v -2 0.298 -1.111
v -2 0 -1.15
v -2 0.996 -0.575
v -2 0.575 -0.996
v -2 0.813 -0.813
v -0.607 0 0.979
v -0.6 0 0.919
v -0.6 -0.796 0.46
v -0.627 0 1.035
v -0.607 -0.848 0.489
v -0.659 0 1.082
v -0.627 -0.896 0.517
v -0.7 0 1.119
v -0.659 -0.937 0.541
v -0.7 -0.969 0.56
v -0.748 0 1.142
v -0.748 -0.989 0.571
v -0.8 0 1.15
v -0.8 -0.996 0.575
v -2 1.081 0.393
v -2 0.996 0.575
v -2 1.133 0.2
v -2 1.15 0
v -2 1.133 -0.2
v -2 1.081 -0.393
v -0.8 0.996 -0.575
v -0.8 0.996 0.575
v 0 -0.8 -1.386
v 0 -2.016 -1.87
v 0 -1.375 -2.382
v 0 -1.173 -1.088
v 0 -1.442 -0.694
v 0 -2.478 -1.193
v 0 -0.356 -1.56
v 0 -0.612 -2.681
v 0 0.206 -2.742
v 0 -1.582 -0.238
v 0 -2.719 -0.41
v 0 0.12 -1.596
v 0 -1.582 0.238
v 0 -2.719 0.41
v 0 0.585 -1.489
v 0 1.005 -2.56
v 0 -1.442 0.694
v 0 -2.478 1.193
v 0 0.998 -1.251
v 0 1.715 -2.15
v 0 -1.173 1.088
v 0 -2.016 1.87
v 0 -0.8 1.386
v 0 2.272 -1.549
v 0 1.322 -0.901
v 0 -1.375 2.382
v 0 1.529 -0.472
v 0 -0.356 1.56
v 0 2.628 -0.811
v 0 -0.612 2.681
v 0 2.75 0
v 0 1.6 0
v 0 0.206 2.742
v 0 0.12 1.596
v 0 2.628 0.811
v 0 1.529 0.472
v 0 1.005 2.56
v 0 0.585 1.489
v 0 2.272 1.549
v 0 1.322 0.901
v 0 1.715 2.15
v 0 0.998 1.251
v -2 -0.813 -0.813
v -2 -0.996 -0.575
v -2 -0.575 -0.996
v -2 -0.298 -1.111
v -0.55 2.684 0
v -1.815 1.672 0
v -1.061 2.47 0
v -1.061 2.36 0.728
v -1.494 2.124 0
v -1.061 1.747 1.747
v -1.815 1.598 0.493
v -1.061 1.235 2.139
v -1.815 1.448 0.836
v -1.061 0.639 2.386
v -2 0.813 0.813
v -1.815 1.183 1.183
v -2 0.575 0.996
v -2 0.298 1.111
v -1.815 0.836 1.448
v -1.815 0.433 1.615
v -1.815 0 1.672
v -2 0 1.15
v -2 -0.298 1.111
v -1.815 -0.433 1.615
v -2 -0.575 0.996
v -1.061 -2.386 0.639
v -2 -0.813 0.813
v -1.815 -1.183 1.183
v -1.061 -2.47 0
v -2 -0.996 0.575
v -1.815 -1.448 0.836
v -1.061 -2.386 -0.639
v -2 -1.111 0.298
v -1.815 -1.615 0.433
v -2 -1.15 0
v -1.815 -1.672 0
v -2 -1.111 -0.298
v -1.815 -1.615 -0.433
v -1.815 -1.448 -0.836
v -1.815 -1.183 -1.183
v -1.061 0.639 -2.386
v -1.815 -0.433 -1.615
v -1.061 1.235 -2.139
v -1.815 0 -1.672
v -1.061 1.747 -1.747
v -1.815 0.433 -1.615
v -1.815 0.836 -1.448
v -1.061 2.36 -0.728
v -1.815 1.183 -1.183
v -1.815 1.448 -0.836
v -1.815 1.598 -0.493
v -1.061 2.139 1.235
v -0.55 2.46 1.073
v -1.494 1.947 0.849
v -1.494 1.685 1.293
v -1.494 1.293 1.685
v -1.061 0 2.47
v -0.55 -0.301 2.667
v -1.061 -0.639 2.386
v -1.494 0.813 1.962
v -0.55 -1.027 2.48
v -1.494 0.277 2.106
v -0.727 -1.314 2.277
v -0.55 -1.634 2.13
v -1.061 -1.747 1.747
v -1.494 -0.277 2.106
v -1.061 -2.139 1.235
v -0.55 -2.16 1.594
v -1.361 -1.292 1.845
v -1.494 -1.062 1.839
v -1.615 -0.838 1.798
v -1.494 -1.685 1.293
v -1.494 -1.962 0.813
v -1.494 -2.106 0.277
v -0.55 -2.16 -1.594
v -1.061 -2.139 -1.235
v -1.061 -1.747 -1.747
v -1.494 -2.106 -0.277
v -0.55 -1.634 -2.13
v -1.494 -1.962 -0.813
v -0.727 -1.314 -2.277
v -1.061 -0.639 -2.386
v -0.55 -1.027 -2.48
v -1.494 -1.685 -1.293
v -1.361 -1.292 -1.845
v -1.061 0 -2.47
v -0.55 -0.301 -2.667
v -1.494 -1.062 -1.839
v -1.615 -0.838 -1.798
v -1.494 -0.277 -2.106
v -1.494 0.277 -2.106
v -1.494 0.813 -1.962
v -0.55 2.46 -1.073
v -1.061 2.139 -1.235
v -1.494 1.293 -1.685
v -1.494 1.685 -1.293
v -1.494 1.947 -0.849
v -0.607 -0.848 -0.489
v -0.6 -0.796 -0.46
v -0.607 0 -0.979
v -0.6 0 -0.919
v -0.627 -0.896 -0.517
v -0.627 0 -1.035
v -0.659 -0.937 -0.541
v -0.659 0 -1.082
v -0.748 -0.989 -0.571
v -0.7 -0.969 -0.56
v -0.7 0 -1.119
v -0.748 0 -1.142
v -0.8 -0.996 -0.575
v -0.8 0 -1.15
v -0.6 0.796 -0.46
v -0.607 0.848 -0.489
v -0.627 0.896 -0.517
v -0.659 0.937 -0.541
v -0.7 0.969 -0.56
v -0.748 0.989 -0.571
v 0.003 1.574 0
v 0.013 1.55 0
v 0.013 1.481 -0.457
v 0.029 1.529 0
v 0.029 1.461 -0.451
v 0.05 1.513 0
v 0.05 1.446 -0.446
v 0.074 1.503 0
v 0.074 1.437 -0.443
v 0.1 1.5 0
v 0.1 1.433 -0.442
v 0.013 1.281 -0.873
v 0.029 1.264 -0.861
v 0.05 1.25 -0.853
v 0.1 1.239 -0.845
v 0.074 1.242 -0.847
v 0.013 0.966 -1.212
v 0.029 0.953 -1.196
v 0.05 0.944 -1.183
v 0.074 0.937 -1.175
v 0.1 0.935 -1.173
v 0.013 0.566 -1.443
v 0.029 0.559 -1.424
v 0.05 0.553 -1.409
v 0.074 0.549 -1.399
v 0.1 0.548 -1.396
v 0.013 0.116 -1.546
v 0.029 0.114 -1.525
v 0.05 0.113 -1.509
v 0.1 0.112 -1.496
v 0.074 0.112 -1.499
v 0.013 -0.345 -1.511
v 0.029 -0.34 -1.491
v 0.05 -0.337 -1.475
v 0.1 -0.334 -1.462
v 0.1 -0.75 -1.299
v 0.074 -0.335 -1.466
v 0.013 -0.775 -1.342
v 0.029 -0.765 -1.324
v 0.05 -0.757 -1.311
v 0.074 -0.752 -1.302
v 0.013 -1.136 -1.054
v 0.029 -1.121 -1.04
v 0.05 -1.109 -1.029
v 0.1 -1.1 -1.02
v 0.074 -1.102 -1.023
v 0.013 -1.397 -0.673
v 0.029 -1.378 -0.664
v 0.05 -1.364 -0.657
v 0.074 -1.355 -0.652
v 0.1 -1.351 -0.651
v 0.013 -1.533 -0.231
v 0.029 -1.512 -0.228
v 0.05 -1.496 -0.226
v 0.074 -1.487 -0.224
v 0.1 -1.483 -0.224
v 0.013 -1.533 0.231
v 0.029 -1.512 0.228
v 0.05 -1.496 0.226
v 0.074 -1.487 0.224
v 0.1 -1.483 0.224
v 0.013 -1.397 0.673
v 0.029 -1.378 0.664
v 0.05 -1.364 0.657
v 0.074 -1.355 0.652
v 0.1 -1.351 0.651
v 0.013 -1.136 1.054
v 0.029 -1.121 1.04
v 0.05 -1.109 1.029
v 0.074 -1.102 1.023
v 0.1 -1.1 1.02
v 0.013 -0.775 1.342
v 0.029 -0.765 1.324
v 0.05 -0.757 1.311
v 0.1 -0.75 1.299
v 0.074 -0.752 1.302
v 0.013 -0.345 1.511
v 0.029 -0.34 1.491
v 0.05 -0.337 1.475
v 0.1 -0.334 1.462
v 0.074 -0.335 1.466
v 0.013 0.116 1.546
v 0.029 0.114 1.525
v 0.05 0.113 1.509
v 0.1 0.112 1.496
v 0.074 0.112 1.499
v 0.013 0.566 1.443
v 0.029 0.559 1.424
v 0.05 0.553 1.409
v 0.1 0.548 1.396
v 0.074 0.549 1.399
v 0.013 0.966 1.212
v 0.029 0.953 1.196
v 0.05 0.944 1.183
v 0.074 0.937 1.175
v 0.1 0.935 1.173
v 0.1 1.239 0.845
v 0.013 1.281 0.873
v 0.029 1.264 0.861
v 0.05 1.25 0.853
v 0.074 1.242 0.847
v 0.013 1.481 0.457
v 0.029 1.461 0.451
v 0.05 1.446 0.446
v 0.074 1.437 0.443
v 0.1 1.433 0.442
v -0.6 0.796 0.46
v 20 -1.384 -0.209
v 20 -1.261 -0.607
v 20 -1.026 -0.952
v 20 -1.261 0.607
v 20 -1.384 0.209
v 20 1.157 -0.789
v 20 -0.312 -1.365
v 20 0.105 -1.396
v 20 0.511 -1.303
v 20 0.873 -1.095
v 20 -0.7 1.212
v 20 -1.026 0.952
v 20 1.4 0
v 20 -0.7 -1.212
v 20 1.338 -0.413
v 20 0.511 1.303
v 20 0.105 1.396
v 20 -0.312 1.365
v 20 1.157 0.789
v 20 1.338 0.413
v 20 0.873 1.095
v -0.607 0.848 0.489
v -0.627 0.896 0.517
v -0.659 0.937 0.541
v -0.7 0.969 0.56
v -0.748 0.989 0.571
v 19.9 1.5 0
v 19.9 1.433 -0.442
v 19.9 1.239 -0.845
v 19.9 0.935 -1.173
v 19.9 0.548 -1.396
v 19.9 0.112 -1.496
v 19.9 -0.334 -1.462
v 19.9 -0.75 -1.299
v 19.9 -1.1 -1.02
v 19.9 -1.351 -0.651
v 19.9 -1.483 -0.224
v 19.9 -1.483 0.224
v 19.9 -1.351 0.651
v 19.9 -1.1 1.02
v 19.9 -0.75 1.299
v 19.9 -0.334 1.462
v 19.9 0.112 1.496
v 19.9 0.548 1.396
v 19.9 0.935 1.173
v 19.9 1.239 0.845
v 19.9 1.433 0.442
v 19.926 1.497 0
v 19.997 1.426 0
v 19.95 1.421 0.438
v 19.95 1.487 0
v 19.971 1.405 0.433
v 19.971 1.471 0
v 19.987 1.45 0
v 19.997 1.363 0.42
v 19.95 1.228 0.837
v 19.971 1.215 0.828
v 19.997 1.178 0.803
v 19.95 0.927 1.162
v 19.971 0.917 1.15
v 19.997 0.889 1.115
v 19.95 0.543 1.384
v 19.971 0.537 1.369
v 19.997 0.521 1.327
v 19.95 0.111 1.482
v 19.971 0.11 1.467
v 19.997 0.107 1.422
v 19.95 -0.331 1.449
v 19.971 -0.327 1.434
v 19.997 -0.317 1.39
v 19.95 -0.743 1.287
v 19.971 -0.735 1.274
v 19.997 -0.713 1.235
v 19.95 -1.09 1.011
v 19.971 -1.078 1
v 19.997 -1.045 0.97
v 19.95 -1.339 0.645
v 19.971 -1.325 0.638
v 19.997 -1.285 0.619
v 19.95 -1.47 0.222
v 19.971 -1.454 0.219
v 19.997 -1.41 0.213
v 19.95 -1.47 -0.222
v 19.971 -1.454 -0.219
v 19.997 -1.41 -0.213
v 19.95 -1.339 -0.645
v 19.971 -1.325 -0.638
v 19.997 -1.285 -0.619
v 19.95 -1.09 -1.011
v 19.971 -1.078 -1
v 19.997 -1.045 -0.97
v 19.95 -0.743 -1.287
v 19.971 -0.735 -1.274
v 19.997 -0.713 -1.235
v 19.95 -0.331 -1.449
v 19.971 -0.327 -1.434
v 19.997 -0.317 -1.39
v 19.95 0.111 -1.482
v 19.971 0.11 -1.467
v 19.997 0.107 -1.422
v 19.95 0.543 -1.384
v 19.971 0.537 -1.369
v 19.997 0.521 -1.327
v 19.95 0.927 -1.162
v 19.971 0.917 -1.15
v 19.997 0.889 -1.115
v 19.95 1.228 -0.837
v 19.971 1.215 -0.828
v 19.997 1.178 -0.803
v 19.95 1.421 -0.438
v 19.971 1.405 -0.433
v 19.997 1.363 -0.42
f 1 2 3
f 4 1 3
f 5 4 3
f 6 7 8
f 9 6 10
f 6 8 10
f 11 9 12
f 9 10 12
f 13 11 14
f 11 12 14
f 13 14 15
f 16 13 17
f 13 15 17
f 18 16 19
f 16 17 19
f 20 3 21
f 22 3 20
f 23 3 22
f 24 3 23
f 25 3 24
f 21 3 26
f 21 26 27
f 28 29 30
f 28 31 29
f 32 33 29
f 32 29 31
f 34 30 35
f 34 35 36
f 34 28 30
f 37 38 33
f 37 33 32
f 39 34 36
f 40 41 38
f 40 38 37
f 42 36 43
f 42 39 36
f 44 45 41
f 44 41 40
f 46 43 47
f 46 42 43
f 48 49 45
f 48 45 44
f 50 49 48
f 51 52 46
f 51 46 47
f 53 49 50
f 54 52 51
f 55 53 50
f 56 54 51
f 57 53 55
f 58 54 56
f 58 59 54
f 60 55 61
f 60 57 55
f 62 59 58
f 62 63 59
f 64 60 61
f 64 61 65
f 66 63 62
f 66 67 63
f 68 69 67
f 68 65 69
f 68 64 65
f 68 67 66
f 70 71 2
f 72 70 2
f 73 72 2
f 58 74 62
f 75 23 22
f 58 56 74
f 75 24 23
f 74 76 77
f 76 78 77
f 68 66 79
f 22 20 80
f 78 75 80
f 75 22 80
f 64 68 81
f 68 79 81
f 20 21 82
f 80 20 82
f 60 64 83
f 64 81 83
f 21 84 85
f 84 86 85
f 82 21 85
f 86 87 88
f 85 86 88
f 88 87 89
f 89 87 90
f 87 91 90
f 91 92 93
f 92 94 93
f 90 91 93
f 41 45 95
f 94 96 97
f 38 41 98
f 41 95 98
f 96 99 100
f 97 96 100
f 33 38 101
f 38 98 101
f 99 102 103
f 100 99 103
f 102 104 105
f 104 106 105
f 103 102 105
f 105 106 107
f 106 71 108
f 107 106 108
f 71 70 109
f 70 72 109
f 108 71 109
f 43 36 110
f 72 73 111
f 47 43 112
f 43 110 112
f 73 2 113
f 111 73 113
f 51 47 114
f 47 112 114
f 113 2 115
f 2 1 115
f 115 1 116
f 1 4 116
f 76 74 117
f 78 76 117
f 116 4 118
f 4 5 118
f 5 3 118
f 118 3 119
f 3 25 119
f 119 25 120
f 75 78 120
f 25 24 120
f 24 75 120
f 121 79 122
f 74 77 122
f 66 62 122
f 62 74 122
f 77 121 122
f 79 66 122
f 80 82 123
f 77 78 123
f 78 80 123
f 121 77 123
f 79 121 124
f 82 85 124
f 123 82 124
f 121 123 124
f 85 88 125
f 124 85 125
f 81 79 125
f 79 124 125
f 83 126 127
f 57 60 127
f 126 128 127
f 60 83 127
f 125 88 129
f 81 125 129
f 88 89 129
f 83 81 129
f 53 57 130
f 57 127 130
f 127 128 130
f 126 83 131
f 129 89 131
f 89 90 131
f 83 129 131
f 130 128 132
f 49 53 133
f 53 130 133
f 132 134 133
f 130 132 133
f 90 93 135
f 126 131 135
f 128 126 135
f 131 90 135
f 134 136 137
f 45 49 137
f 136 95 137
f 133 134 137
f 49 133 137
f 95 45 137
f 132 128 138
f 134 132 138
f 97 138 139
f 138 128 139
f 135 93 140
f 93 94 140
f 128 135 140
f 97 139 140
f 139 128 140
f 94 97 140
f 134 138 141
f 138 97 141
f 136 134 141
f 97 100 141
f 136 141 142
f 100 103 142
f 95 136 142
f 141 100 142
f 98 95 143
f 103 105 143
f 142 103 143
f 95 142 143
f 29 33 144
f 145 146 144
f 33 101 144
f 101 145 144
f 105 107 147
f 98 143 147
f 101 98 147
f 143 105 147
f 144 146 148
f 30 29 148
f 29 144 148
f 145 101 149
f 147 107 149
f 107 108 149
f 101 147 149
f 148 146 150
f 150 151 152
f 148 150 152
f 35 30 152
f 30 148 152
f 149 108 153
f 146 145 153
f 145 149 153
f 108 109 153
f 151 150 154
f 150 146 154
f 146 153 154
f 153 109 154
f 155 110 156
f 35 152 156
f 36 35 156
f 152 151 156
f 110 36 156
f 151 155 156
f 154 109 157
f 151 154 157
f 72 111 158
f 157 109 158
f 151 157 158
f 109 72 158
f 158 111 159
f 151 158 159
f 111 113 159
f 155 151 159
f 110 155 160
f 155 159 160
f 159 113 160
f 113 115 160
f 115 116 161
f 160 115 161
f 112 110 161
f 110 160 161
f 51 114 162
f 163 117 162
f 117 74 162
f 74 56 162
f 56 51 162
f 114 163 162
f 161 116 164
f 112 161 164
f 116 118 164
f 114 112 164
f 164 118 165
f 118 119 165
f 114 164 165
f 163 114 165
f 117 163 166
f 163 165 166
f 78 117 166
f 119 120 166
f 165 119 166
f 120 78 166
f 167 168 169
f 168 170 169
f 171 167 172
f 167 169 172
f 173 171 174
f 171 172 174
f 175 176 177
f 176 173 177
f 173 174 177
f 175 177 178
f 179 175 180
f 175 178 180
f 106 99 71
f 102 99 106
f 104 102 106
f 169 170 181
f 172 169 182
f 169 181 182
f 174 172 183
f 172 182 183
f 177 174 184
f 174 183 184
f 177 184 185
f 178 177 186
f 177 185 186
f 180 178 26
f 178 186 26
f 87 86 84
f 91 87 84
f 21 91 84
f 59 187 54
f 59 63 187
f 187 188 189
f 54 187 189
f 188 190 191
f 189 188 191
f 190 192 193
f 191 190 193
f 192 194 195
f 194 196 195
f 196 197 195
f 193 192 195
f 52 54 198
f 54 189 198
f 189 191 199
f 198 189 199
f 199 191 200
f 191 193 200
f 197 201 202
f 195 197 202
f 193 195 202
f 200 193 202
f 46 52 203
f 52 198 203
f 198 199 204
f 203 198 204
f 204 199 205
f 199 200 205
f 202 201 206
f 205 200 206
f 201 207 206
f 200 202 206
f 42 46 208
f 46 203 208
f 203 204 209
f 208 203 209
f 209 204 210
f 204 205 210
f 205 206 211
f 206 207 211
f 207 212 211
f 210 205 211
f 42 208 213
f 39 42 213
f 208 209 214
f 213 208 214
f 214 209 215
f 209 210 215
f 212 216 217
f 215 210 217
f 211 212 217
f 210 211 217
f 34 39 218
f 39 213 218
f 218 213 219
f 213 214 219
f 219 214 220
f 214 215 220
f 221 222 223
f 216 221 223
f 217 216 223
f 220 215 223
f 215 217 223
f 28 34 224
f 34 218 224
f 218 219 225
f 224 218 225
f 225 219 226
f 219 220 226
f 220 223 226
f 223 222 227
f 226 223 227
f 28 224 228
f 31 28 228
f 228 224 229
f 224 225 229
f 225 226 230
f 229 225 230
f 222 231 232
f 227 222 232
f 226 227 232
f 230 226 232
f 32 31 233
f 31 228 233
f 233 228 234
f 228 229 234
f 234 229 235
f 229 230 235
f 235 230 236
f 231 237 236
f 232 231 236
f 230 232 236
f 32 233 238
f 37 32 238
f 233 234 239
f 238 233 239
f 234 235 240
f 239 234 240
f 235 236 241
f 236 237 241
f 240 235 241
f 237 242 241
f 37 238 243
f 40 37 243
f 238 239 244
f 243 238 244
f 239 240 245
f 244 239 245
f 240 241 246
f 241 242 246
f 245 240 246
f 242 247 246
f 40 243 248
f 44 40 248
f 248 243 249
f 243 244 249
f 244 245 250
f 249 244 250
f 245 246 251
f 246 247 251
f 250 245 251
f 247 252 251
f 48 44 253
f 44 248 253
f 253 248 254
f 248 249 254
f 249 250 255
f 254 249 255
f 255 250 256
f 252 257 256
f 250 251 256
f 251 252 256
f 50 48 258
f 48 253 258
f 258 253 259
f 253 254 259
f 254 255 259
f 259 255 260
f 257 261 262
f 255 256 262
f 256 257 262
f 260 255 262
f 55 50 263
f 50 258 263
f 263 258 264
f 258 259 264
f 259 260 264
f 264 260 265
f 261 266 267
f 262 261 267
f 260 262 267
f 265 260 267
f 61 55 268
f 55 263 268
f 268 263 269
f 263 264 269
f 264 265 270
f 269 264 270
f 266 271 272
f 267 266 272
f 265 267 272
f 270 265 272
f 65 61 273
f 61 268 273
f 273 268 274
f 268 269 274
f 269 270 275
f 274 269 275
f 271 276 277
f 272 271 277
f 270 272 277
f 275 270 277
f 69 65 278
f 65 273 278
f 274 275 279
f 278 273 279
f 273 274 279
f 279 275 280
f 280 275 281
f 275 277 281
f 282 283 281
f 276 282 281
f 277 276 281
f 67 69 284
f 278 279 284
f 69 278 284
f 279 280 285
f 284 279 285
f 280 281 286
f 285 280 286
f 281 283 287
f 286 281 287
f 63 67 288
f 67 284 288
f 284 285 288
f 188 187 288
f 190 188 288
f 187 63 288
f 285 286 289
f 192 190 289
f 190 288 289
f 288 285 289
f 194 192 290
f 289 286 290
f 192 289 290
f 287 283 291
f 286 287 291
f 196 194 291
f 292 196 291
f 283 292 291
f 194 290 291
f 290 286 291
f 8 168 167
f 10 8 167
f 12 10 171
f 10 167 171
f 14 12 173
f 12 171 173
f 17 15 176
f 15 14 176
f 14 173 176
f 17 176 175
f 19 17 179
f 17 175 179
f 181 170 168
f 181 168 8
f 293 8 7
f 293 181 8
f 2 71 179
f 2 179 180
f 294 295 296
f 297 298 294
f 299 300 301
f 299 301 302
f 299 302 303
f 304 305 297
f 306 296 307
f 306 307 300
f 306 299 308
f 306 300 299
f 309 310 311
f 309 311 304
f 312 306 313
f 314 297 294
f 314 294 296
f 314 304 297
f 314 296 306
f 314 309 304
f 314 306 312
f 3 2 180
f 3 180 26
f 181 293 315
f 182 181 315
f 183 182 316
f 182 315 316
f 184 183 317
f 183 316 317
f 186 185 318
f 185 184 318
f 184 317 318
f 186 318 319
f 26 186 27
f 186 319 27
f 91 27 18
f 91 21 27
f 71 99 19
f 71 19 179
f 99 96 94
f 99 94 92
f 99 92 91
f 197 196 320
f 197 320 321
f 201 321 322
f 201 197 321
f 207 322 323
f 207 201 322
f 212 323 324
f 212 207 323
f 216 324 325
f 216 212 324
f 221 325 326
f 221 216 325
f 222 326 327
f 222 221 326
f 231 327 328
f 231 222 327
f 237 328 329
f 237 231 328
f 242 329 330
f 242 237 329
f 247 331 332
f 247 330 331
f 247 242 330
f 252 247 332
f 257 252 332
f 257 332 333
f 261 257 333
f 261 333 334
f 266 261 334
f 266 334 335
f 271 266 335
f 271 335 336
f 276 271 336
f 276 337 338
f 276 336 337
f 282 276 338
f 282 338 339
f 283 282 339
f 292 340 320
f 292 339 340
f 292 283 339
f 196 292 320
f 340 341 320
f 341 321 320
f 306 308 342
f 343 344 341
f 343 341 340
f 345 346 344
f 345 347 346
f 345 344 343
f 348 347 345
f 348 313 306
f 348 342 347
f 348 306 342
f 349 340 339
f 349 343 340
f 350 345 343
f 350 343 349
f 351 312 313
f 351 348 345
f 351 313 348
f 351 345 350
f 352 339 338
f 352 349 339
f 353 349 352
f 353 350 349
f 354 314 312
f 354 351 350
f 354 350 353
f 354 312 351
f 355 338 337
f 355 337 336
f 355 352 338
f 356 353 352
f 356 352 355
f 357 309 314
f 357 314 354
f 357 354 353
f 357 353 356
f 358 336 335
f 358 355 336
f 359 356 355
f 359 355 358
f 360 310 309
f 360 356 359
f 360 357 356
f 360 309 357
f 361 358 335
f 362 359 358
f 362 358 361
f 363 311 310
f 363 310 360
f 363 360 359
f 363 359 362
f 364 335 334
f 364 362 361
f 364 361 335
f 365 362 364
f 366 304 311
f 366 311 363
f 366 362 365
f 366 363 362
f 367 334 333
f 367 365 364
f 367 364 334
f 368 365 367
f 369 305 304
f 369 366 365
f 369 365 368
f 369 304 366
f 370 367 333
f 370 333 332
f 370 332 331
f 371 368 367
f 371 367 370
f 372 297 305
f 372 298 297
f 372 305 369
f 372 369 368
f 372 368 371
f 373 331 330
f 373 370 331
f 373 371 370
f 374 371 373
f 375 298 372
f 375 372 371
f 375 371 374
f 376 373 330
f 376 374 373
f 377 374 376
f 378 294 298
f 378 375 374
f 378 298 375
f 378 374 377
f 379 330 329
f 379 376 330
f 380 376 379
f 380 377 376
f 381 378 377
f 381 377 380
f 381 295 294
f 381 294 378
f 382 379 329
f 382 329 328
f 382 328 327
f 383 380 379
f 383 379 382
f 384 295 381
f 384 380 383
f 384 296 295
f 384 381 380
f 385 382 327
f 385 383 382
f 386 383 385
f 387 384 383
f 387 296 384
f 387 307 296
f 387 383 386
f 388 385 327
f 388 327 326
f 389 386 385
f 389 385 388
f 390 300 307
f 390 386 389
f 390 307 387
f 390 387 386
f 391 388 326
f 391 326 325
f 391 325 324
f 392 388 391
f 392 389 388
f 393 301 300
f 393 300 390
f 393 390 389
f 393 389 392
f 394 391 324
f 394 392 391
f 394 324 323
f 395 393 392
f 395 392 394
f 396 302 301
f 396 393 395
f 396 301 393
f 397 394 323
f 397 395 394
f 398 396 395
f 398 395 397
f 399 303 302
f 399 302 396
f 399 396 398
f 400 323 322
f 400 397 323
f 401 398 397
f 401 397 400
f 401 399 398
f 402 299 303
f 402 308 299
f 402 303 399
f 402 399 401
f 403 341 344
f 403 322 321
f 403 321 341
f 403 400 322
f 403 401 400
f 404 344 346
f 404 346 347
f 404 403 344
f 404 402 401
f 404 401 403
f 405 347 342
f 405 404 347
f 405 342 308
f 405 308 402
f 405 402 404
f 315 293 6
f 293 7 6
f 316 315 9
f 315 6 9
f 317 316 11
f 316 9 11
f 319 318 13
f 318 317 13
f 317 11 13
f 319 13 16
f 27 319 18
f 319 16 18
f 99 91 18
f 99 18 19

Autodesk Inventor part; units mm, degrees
ref_plane "YZ Plane" through (0, 0, 0) normal (1, 0, 0) x (0, 1, 0)
ref_plane "XZ Plane" through (0, 0, 0) normal (0, 1, 0) x (-1, 0, 0)
ref_plane "XY Plane" through (0, 0, 0) normal (0, 0, 1) x (1, 0, 0)
sketch "スケッチ1" plane through (0, 0, 0) normal (0, 0, 1) x (1, 0, 0)
  line L0 (0, 0) -> (20, 0)
  line L1 (20, 0) -> (20, 1.5)
  line L2 (20, 1.5) -> (0, 1.5)
  line L3 (0, 1.5) -> (0, 0)
  line L4 (0, 0) -> (0, 2.75)
  line L5 (0, 0) -> (-2, 0)
  line L6 (-2, 0) -> (0, 0)
  line L7 (-2, 0) -> (-2, 1.15)
  arc A0 (0, 2.75) -> (-2, 1.15) centre (-0.0403, 0.7504) ccw
  dimension "d0" = 1.5
  dimension "d1" = 20
  dimension "d3" = 2
  dimension "d4" = 2.75
  dimension "d5" = 1.15
  dimension "d6" = 2
revolve "回転1" add sketch "スケッチ1" angle 360 about axis through (-2, 0, 0) along (1, 0, 0)
thread "ねじ1" size "M3x0.5" class "6g" standard "ANSI Metric M Profile" length 100
sketch "スケッチ2" plane through (-2, 0, 0) normal (-1, 0, 0) x (0, 0, 1)
  circle A0 centre (0, 0) radius 1.15 projected
  line L0 (-0.575, 0.9959) -> (0.575, 0.9959)
  line L1 (0.575, 0.9959) -> (1.15, 0)
  line L2 (1.15, 0) -> (0.575, -0.9959)
  line L3 (0.575, -0.9959) -> (-0.575, -0.9959)
  line L4 (-0.575, -0.9959) -> (-1.15, 0)
  line L5 (-1.15, 0) -> (-0.575, 0.9959)
  dimension "d10" = 1.15
  dimension "d11" = 1.9919
extrude "押し出し1" cut sketch "スケッチ2" against normal blind 1.4 contours L2 L3 L4 L5 L0 L1
fillet "フィレット1" radius 0.2 6 edges at (-0.6, 0.9959, 0) (-0.6, 0.498, 0.8625) (-0.6, 0.498, -0.8625) (-0.6, -0.498, -0.8625) (-0.6, -0.9959, 0) (-0.6, -0.498, 0.8625)
fillet "フィレット2" radius 0.1 1 edges at (0, -1.5, 0)
fillet "フィレット3" radius 0.1 1 edges at (20, -1.5, 0)
properties part number "ネジボタンM3L20" material "鋼"
